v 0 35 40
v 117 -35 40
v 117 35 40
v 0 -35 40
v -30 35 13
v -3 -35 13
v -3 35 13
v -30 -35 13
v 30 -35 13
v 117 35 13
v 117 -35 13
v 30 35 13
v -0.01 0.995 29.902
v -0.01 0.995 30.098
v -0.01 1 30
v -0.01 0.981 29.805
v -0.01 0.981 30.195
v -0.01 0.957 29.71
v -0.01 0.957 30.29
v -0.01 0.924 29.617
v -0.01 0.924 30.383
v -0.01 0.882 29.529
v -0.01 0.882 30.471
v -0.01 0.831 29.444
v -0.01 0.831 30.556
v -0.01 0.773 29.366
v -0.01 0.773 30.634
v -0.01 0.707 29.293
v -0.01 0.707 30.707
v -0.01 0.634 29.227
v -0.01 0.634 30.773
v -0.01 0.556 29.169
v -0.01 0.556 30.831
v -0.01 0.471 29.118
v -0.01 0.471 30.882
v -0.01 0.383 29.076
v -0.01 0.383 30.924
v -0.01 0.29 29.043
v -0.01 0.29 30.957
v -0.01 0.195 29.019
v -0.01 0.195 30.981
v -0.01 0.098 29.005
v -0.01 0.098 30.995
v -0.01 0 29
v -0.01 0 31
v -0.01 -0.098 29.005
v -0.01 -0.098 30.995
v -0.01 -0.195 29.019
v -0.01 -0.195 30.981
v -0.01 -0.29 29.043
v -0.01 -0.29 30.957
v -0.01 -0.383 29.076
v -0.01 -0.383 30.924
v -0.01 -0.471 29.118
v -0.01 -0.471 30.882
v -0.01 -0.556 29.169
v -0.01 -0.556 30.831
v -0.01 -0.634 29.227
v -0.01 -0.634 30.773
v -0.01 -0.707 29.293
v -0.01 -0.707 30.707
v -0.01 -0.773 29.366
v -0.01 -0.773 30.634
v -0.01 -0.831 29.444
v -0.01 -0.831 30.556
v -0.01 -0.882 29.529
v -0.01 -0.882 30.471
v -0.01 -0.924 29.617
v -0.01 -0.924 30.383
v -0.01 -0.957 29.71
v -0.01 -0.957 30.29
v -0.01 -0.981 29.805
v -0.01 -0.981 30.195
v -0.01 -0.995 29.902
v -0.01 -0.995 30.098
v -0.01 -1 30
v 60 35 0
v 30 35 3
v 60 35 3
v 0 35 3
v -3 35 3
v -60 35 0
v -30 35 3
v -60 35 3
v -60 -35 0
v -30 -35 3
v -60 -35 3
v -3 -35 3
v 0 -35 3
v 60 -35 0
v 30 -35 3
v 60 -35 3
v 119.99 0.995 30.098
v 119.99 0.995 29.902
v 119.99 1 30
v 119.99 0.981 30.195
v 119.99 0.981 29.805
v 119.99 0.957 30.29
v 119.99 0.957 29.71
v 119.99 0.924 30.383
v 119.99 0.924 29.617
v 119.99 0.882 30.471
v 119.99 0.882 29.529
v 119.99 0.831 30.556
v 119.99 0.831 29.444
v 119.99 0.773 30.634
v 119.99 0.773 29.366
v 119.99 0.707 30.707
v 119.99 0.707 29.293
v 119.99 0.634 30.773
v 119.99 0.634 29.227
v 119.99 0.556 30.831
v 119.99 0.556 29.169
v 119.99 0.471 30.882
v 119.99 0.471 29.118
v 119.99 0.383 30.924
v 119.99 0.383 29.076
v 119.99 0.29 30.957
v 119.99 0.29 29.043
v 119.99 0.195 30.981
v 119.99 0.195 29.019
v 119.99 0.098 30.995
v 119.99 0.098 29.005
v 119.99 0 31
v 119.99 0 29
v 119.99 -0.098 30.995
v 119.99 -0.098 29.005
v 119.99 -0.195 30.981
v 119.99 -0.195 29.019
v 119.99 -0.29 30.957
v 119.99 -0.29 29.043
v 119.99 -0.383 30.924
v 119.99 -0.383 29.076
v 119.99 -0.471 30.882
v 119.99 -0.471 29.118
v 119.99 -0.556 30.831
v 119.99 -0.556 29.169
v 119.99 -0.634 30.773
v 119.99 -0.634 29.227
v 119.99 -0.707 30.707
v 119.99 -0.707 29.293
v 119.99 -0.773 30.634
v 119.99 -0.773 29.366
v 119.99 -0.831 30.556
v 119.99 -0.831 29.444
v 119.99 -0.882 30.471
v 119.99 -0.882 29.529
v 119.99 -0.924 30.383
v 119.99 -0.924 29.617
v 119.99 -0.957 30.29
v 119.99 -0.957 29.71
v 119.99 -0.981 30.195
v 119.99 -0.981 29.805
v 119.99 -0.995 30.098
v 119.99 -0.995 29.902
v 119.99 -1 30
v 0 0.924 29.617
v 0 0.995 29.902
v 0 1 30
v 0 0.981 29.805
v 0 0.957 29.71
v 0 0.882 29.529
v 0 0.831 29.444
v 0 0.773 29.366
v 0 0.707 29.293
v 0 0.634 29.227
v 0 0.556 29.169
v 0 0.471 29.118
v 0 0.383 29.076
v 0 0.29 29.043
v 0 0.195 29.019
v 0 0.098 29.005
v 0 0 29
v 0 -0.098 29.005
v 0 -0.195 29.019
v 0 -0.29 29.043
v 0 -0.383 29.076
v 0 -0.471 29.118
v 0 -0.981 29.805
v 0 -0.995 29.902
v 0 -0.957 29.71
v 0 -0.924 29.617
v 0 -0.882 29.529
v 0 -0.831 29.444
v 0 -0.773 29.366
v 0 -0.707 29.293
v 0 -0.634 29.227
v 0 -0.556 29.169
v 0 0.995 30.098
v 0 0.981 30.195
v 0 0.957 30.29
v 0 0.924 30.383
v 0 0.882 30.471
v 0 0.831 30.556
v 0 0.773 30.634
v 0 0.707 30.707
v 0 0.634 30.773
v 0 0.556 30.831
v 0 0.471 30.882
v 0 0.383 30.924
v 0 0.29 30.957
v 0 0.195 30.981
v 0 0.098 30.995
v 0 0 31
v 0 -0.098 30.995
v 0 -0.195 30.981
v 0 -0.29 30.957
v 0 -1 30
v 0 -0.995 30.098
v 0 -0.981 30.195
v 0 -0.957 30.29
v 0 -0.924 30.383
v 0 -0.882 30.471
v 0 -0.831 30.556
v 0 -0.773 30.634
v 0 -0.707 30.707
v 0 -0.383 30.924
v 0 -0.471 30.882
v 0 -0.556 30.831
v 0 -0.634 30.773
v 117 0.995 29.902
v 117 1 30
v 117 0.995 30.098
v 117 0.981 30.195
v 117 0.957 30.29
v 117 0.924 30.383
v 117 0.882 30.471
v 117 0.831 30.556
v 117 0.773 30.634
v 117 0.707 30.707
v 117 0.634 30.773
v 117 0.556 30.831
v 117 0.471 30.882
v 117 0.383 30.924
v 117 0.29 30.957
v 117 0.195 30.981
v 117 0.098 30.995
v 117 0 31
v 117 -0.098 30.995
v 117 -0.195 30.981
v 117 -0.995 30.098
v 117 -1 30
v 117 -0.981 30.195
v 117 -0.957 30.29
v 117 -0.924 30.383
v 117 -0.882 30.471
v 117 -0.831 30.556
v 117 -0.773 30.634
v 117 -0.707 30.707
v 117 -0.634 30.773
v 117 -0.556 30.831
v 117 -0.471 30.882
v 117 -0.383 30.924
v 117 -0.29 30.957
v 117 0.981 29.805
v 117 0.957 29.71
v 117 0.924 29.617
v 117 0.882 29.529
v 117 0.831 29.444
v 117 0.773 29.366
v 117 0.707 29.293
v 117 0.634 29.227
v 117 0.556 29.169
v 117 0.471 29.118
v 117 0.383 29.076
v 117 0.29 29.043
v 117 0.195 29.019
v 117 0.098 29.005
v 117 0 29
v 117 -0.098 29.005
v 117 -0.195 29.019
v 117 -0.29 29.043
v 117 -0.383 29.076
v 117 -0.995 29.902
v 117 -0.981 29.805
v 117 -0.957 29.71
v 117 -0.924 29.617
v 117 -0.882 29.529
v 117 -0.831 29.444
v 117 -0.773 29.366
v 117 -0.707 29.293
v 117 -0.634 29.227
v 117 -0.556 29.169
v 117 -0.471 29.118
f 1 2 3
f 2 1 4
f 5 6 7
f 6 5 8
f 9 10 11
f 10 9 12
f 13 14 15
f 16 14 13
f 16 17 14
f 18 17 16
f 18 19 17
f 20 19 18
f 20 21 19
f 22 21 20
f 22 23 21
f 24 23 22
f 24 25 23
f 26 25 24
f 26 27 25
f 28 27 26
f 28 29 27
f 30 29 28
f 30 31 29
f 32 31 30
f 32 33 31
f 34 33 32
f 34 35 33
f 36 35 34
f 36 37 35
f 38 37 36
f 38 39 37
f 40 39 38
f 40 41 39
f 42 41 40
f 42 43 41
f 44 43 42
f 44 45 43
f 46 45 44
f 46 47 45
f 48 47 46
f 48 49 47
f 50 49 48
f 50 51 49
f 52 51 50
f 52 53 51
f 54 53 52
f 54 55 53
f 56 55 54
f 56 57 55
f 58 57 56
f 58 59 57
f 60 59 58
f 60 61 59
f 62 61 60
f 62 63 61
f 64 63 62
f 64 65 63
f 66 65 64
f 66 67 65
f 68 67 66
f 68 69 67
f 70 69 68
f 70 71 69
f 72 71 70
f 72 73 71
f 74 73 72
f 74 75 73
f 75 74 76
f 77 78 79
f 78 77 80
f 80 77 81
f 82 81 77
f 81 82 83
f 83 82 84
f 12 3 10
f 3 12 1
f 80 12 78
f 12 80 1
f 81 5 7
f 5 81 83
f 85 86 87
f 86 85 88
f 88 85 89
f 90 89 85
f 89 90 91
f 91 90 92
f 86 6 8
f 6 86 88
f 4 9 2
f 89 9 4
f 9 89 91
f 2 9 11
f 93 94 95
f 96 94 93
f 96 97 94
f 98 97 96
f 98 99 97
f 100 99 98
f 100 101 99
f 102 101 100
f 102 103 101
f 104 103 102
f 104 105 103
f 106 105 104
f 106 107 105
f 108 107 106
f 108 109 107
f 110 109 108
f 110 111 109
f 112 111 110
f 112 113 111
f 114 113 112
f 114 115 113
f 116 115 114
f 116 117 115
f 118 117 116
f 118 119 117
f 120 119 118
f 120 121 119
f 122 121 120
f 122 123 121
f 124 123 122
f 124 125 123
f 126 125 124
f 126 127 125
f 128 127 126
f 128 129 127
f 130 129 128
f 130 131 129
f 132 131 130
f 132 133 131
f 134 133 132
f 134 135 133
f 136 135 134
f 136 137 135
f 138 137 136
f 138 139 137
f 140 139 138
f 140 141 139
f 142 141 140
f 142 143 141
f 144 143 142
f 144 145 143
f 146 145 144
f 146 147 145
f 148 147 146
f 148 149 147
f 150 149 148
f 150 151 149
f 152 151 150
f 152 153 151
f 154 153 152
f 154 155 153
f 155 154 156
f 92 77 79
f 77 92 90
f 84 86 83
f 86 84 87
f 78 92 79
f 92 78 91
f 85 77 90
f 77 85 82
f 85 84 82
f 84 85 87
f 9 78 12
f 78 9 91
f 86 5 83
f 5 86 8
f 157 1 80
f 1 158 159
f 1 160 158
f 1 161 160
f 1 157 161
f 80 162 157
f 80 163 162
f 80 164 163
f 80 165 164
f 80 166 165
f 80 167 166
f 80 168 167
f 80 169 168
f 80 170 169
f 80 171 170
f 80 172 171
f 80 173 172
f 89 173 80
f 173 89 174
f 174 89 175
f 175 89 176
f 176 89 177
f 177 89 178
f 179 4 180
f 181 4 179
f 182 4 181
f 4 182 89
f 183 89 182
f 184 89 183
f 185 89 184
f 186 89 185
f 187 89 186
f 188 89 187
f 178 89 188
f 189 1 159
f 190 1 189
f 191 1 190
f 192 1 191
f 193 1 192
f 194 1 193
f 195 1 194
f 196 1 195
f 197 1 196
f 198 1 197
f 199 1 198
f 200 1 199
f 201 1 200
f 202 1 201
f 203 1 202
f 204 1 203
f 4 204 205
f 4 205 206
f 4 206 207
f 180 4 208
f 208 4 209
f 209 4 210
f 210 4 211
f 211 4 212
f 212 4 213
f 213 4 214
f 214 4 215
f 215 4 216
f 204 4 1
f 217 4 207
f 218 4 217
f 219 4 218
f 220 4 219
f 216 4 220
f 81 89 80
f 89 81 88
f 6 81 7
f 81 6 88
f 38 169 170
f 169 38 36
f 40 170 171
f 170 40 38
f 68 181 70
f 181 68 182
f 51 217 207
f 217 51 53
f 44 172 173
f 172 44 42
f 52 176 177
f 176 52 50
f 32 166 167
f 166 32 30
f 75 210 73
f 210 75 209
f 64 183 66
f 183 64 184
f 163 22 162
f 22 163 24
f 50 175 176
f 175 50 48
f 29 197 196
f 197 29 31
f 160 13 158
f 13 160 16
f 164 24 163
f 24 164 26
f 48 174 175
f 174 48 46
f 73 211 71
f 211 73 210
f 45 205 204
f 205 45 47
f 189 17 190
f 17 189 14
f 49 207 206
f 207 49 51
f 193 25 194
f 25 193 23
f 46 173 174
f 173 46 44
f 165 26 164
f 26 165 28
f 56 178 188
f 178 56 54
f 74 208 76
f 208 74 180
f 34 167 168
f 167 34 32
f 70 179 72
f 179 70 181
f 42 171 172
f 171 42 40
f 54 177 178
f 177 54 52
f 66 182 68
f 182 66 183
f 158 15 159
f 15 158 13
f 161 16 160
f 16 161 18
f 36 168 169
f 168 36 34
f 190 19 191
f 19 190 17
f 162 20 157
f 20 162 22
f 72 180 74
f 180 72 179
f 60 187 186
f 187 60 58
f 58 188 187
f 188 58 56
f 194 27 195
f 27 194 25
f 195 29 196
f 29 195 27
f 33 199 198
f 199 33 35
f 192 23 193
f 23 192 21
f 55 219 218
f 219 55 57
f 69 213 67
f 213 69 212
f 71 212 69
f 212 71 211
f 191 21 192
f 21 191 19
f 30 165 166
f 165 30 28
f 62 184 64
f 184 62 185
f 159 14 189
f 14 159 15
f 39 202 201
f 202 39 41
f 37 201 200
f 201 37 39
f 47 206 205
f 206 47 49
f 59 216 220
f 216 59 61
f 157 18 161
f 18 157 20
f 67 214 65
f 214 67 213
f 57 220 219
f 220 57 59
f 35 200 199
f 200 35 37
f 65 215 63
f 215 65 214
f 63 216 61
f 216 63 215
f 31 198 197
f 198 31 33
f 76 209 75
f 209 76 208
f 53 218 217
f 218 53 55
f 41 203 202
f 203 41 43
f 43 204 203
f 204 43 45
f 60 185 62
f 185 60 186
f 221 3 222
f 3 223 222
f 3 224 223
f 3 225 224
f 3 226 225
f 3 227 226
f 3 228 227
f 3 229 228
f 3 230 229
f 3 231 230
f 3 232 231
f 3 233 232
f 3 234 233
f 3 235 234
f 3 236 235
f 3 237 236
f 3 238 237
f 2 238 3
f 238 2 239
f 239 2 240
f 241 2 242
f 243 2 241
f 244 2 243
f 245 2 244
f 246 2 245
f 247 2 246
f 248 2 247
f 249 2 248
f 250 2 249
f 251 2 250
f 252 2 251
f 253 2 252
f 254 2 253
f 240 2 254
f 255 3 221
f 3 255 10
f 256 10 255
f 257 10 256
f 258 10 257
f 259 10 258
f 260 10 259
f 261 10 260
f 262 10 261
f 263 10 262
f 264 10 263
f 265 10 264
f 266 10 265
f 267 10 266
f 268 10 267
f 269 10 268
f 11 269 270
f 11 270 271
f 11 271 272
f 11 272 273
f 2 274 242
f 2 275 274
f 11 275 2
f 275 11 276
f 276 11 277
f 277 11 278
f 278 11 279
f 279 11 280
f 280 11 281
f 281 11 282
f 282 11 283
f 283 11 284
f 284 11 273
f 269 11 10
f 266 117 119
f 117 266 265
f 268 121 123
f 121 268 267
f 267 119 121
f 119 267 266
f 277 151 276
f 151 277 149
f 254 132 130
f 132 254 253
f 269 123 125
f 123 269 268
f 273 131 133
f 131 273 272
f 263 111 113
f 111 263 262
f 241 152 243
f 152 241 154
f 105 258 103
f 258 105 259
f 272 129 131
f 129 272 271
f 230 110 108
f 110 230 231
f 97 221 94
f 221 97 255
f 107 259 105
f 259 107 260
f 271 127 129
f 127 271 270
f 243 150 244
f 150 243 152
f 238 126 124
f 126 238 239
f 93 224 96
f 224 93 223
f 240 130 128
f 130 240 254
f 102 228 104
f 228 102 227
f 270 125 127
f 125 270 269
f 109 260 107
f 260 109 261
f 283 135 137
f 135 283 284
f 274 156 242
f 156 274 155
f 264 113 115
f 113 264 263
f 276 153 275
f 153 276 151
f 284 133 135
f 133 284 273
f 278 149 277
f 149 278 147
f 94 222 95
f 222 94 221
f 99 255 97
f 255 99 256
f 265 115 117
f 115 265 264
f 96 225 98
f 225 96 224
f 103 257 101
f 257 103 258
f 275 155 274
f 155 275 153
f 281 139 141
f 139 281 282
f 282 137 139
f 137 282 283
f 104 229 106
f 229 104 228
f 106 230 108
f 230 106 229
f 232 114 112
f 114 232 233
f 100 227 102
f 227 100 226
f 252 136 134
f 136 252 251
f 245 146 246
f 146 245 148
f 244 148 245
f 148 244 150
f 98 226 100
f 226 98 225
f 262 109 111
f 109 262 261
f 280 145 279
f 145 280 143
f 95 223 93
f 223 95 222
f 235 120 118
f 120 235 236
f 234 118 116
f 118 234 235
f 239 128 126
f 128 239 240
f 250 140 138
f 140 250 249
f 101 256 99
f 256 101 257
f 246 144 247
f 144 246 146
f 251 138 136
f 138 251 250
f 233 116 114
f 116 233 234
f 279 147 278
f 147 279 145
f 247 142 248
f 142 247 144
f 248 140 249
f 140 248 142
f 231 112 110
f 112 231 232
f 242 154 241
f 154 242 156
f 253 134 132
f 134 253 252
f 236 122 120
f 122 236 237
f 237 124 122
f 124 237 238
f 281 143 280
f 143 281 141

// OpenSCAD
// Mini horizontal gel-electrophoresis box - buffer tank
// Print orientation: tank rests on XY plane at z = 0, open top

// ---------- Parameters ----------
tank_x      = 120;   // outer length in X
tank_y      = 70;    // outer width in Y
tank_h      = 40;    // outer height in Z
wall        = 3;     // wall thickness (sides and floor)
floor       = 3;     // floor thickness (under raised platform)
platform_t  = 10;    // platform top height above inner floor (z = 13)
platform_x  = 60;    // platform length in X (centred)
hole_d      = 2;     // electrode hole diameter
hole_y      = 0;     // electrode hole Y position
hole_z      = 30;    // electrode hole Z position
eps         = 0.5;   // cutter overshoot past faces

$fn = 64;

// ---------- Derived ----------
inner_f = tank_h - floor - platform_t;   // chamber height above platform
chamber_v = [tank_x - platform_x, tank_y, inner_f];  // each chamber (X/Y/Z)

// ---------- Model ----------
difference() {
    union() {
        // Floor
        translate([-tank_x/2, -tank_y/2, 0])
            cube([tank_x, tank_y, floor]);

        // Raised platform (centred in X, spans full Y)
        translate([-platform_x/2, -tank_y/2, floor])
            cube([platform_x, tank_y, platform_t]);

        // Two buffer chambers above platform
        for (sx = [-1, 1])
            translate([sx > 0 ? tank_x - platform_x - 0.01 : -0.01,
                       -tank_y/2,
                       floor + platform_t])
                cube(chamber_v);
    }

    // End walls with horizontal electrode holes along X
    for (sx = [-1, 1]) {
        x0 = sx > 0 ? tank_x - wall : -wall;
        difference() {
            translate([x0, -tank_y/2 - 0.01, floor])
                cube([wall, tank_y + 0.02, tank_h - floor]);
            translate([x0 - eps, hole_y, hole_z])
                rotate([0, 90, 0])
                    cylinder(d = hole_d, h = wall + 2*eps);
        }
    }
}
